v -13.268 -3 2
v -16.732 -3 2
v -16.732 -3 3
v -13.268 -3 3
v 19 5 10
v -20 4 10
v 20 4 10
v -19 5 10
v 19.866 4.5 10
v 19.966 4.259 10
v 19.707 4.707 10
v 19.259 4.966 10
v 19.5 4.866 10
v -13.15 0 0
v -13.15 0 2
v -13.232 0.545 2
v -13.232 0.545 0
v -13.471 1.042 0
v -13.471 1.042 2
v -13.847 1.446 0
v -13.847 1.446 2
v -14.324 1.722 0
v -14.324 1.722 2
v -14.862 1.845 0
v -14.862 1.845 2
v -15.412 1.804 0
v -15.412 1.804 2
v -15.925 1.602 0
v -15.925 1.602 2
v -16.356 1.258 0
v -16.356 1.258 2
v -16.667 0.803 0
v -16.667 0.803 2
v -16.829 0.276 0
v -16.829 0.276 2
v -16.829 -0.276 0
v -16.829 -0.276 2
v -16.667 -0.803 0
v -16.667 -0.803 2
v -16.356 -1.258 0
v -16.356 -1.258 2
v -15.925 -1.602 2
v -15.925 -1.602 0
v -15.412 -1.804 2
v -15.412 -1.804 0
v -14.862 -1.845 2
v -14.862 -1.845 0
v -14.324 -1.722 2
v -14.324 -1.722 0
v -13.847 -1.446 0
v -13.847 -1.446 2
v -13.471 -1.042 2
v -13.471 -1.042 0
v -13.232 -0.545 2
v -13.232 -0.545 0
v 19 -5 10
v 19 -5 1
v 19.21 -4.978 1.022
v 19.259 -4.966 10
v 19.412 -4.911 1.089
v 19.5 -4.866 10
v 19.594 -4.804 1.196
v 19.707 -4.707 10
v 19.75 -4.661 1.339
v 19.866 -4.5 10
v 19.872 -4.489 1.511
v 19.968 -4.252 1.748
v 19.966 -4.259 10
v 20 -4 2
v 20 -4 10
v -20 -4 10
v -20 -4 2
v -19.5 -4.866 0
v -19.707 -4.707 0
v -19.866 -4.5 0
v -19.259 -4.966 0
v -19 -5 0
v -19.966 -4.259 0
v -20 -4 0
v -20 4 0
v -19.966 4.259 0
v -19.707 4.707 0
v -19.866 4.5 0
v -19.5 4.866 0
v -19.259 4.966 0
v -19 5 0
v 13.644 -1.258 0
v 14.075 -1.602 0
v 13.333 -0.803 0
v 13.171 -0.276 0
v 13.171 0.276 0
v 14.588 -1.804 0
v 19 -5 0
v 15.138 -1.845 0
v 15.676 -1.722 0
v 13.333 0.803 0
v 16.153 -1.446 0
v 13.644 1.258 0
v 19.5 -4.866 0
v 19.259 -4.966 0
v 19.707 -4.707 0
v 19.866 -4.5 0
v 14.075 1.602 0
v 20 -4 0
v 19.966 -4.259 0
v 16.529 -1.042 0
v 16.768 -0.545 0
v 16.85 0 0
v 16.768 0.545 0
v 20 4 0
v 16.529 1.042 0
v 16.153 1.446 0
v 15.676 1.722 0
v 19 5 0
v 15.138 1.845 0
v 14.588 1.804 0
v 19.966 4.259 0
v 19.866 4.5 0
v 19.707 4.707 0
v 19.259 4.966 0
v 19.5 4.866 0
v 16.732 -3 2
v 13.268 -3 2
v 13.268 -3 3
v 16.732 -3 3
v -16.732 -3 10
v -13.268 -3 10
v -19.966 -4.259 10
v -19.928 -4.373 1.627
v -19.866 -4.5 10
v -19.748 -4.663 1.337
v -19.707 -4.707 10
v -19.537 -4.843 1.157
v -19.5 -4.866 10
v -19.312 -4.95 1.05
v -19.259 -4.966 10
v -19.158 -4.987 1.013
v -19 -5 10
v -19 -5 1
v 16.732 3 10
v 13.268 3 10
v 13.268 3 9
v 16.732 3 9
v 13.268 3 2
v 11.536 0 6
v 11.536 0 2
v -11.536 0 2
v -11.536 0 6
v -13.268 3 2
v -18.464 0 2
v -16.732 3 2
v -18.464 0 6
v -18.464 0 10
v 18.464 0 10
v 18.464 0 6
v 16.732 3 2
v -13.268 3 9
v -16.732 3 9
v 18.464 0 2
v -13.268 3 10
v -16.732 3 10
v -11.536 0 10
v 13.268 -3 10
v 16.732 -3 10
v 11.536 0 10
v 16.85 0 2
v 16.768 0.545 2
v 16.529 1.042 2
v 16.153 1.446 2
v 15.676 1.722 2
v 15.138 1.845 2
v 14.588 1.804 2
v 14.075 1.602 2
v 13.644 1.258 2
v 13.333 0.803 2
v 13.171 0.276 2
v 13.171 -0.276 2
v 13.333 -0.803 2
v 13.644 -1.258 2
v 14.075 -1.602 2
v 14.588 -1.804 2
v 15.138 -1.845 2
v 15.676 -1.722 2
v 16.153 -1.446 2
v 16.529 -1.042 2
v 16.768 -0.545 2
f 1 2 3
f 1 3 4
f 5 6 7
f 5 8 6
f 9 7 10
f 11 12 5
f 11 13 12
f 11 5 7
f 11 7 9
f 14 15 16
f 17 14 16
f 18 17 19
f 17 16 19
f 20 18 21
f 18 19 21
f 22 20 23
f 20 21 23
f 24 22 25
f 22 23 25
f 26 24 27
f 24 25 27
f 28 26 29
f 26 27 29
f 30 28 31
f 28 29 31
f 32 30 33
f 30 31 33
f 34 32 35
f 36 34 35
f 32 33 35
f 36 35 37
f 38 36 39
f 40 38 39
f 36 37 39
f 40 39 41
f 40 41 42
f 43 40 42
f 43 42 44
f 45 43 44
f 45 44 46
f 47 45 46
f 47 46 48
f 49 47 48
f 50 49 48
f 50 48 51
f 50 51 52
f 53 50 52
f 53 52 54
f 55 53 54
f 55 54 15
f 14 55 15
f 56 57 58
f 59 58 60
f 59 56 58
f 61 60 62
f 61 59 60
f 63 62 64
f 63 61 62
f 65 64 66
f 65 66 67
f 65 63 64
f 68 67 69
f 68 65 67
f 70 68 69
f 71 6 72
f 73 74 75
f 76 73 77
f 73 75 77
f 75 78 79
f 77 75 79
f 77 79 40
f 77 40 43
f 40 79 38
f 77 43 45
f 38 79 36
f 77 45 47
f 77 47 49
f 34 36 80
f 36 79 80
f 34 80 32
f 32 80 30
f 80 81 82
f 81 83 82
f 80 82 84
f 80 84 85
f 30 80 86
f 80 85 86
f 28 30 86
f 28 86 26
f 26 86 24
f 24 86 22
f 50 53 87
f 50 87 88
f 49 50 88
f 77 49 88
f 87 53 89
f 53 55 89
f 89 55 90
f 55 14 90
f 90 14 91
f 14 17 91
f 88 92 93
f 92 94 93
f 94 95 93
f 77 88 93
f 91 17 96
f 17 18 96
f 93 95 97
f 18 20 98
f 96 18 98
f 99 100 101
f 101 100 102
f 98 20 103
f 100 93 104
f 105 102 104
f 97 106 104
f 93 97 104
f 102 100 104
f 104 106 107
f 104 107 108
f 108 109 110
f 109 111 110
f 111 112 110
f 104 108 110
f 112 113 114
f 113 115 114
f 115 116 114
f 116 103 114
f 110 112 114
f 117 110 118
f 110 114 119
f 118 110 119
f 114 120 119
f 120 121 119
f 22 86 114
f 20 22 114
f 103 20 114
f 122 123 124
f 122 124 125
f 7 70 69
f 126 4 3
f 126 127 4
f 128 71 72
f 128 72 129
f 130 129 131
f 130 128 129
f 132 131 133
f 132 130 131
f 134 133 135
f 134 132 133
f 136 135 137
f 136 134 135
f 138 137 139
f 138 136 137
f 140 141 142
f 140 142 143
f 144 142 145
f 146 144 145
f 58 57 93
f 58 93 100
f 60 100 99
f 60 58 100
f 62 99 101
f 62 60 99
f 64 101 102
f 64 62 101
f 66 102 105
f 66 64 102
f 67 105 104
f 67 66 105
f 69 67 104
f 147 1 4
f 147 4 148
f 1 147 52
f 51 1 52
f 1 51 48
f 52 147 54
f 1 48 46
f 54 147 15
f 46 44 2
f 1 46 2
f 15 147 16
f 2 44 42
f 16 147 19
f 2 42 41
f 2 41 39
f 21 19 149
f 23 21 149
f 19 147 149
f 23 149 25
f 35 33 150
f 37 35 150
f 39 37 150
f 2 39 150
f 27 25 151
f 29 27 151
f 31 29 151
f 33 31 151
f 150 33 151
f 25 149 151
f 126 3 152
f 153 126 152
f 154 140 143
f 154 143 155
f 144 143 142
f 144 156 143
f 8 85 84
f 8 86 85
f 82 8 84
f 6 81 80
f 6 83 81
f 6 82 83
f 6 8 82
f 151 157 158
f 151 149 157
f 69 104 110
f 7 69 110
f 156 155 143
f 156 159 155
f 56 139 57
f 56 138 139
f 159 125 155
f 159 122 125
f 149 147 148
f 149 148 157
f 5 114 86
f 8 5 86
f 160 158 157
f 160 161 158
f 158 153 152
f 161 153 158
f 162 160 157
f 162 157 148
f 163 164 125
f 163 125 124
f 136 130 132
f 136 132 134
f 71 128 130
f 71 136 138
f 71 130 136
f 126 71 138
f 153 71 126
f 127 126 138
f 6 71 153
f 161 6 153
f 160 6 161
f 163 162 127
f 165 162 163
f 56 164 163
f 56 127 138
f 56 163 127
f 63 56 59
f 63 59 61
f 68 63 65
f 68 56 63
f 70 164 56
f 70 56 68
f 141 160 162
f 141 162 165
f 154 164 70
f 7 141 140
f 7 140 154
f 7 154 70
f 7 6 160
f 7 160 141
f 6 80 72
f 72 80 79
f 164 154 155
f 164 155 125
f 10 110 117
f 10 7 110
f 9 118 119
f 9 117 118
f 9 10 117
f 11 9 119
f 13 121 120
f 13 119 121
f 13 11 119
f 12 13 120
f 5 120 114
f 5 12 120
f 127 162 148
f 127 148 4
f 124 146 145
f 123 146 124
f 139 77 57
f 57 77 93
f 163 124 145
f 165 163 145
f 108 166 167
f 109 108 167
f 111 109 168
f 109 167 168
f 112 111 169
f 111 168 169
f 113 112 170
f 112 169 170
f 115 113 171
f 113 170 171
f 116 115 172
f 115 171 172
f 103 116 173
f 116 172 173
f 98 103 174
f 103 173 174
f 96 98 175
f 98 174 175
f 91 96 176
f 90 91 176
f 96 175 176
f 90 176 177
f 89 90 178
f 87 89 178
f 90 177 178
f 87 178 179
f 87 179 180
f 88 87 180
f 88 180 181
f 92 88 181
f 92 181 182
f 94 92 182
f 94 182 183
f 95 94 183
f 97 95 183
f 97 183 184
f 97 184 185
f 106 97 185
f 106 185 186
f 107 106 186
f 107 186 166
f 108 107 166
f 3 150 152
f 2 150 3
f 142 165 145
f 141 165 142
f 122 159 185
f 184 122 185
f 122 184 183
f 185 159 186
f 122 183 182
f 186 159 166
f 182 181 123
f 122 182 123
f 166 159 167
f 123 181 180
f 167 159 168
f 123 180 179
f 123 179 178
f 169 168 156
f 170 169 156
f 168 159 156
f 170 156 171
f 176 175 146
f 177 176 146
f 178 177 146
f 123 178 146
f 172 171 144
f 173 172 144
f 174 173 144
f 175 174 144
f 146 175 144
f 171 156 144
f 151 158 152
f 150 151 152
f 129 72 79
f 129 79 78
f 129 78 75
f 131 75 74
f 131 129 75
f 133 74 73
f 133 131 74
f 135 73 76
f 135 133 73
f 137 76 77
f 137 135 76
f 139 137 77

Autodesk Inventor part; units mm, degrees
ref_plane "YZ Plane" through (0, 0, 0) normal (1, 0, 0) x (0, 1, 0)
ref_plane "XZ Plane" through (0, 0, 0) normal (0, 1, 0) x (-1, 0, 0)
sketch "Sketch1" plane through (0, 0, 0) normal (0, 0, 1) x (1, 0, 0)
  line L0 (-20, -5) -> (20, -5)
  line L1 (20, -5) -> (20, 5)
  line L2 (20, 5) -> (-20, 5)
  line L3 (-20, 5) -> (-20, -5)
  line L4 (-20, -5) -> (20, 5) construction
  line L5 (20, -5) -> (-20, 5) construction
  point P0 (0, 0)
  dimension "d0" = 10
  dimension "d1" = 40
extrude "Extrusion1" add sketch "Sketch1" along normal blind 10
sketch "Sketch2" plane through (0, 0, 10) normal (0, 0, 1) x (1, 0, 0)
  line L0 (-28, 0) -> (28, 0) projected
  circle A0 centre (-15, 0) radius 1.85
  circle A1 centre (15, 0) radius 1.85
  point P0 (0, 0)
  point P1 (16.85, 0)
  point P2 (13.15, 0)
  dimension "d4" = 3.7
  dimension "d5" = 3.7
  dimension "d6" = 15
  dimension "d7" = 15
extrude "Extrusion2" cut sketch "Sketch2" against normal through all
chamfer "Chamfer1" distance 9 angle 45 1 edges at (0, -5, 10)
ref_plane "Work Plane1" through (0, 0, 2) normal (0, 0, -1) x (-1, 0, 0)
sketch "Sketch3" plane through (0, 0, 2) normal (0, 0, -1) x (-1, 0, 0)
  circle A0 centre (15, 0) radius 1.85 projected
  circle A1 centre (-15, 0) radius 1.85 projected
  line L0 (11.5359, 0) -> (13.2679, 3)
  line L1 (13.2679, 3) -> (16.7321, 3)
  line L2 (16.7321, 3) -> (18.4641, 0)
  line L3 (18.4641, 0) -> (16.7321, -3)
  line L4 (16.7321, -3) -> (13.2679, -3)
  line L5 (13.2679, -3) -> (11.5359, 0)
  line L6 (-18.4641, 0) -> (-16.7321, 3)
  line L7 (-16.7321, 3) -> (-13.2679, 3)
  line L8 (-13.2679, 3) -> (-11.5359, 0)
  line L9 (-11.5359, 0) -> (-13.2679, -3)
  line L10 (-13.2679, -3) -> (-16.7321, -3)
  line L11 (-16.7321, -3) -> (-18.4641, 0)
  point P0 (0, 0)
  point P1 (15, 3)
  dimension "d14" = 6
  dimension "d15" = 6
extrude "Extrusion3" cut sketch "Sketch3" against normal up to surface contours A1 | L0 L1 L2 L3 L4 L5 | L6 L7 L8 L9 L10 L11 surface through (-10, -0.5, 5.5) normal (0, -0.7071068, 0.7071068)
fillet "Fillet1" radius 1 4 edges at (20, 5, 5) (20, -5, 0.5) (-20, 5, 5) (-20, -5, 0.5)
sketch "Sketch4" plane through (0, 0, 10) normal (0, 0, 1) x (1, 0, 0)
  line L0 (16.7321, 3) -> (18.4641, 0) projected
  line L1 (18.4641, 0) -> (16.7321, -3) projected
  line L2 (16.7321, -3) -> (13.2679, -3) projected
  line L3 (13.2679, -3) -> (11.5359, 0) projected
  line L4 (11.5359, 0) -> (13.2679, 3) projected
  line L5 (13.2679, 3) -> (16.7321, 3) projected
  line L6 (-16.7321, 3) -> (-13.2679, 3) projected
  line L7 (-13.2679, 3) -> (-11.5359, 0) projected
  line L8 (-11.5359, 0) -> (-13.2679, -3) projected
  line L9 (-13.2679, -3) -> (-16.7321, -3) projected
  line L10 (-16.7321, -3) -> (-18.4641, 0) projected
  line L11 (-18.4641, 0) -> (-16.7321, 3) projected
  arc A0 (-20, -4) -> (-19, -5) centre (-19, -4) ccw projected
  line L12 (-19, -5) -> (19, -5) projected
  arc A1 (19, -5) -> (20, -4) centre (19, -4) ccw projected
  line L13 (20, -4) -> (20, 4) projected
  line L14 (20, 4) -> (-20, 4) projected
  line L15 (-20, 4) -> (-20, -4) projected
  point P0 (0, 0)
extrude "Extrusion4" add sketch "Sketch4" against normal up to surface surface through (-10, -0.5, 5.5) normal (0, -0.7071068, 0.7071068)
equation "\"d5\" = d4"
equation "\"d7\" = d6"
equation "\"d15\" = d14"
properties part number "_3DPrint"
